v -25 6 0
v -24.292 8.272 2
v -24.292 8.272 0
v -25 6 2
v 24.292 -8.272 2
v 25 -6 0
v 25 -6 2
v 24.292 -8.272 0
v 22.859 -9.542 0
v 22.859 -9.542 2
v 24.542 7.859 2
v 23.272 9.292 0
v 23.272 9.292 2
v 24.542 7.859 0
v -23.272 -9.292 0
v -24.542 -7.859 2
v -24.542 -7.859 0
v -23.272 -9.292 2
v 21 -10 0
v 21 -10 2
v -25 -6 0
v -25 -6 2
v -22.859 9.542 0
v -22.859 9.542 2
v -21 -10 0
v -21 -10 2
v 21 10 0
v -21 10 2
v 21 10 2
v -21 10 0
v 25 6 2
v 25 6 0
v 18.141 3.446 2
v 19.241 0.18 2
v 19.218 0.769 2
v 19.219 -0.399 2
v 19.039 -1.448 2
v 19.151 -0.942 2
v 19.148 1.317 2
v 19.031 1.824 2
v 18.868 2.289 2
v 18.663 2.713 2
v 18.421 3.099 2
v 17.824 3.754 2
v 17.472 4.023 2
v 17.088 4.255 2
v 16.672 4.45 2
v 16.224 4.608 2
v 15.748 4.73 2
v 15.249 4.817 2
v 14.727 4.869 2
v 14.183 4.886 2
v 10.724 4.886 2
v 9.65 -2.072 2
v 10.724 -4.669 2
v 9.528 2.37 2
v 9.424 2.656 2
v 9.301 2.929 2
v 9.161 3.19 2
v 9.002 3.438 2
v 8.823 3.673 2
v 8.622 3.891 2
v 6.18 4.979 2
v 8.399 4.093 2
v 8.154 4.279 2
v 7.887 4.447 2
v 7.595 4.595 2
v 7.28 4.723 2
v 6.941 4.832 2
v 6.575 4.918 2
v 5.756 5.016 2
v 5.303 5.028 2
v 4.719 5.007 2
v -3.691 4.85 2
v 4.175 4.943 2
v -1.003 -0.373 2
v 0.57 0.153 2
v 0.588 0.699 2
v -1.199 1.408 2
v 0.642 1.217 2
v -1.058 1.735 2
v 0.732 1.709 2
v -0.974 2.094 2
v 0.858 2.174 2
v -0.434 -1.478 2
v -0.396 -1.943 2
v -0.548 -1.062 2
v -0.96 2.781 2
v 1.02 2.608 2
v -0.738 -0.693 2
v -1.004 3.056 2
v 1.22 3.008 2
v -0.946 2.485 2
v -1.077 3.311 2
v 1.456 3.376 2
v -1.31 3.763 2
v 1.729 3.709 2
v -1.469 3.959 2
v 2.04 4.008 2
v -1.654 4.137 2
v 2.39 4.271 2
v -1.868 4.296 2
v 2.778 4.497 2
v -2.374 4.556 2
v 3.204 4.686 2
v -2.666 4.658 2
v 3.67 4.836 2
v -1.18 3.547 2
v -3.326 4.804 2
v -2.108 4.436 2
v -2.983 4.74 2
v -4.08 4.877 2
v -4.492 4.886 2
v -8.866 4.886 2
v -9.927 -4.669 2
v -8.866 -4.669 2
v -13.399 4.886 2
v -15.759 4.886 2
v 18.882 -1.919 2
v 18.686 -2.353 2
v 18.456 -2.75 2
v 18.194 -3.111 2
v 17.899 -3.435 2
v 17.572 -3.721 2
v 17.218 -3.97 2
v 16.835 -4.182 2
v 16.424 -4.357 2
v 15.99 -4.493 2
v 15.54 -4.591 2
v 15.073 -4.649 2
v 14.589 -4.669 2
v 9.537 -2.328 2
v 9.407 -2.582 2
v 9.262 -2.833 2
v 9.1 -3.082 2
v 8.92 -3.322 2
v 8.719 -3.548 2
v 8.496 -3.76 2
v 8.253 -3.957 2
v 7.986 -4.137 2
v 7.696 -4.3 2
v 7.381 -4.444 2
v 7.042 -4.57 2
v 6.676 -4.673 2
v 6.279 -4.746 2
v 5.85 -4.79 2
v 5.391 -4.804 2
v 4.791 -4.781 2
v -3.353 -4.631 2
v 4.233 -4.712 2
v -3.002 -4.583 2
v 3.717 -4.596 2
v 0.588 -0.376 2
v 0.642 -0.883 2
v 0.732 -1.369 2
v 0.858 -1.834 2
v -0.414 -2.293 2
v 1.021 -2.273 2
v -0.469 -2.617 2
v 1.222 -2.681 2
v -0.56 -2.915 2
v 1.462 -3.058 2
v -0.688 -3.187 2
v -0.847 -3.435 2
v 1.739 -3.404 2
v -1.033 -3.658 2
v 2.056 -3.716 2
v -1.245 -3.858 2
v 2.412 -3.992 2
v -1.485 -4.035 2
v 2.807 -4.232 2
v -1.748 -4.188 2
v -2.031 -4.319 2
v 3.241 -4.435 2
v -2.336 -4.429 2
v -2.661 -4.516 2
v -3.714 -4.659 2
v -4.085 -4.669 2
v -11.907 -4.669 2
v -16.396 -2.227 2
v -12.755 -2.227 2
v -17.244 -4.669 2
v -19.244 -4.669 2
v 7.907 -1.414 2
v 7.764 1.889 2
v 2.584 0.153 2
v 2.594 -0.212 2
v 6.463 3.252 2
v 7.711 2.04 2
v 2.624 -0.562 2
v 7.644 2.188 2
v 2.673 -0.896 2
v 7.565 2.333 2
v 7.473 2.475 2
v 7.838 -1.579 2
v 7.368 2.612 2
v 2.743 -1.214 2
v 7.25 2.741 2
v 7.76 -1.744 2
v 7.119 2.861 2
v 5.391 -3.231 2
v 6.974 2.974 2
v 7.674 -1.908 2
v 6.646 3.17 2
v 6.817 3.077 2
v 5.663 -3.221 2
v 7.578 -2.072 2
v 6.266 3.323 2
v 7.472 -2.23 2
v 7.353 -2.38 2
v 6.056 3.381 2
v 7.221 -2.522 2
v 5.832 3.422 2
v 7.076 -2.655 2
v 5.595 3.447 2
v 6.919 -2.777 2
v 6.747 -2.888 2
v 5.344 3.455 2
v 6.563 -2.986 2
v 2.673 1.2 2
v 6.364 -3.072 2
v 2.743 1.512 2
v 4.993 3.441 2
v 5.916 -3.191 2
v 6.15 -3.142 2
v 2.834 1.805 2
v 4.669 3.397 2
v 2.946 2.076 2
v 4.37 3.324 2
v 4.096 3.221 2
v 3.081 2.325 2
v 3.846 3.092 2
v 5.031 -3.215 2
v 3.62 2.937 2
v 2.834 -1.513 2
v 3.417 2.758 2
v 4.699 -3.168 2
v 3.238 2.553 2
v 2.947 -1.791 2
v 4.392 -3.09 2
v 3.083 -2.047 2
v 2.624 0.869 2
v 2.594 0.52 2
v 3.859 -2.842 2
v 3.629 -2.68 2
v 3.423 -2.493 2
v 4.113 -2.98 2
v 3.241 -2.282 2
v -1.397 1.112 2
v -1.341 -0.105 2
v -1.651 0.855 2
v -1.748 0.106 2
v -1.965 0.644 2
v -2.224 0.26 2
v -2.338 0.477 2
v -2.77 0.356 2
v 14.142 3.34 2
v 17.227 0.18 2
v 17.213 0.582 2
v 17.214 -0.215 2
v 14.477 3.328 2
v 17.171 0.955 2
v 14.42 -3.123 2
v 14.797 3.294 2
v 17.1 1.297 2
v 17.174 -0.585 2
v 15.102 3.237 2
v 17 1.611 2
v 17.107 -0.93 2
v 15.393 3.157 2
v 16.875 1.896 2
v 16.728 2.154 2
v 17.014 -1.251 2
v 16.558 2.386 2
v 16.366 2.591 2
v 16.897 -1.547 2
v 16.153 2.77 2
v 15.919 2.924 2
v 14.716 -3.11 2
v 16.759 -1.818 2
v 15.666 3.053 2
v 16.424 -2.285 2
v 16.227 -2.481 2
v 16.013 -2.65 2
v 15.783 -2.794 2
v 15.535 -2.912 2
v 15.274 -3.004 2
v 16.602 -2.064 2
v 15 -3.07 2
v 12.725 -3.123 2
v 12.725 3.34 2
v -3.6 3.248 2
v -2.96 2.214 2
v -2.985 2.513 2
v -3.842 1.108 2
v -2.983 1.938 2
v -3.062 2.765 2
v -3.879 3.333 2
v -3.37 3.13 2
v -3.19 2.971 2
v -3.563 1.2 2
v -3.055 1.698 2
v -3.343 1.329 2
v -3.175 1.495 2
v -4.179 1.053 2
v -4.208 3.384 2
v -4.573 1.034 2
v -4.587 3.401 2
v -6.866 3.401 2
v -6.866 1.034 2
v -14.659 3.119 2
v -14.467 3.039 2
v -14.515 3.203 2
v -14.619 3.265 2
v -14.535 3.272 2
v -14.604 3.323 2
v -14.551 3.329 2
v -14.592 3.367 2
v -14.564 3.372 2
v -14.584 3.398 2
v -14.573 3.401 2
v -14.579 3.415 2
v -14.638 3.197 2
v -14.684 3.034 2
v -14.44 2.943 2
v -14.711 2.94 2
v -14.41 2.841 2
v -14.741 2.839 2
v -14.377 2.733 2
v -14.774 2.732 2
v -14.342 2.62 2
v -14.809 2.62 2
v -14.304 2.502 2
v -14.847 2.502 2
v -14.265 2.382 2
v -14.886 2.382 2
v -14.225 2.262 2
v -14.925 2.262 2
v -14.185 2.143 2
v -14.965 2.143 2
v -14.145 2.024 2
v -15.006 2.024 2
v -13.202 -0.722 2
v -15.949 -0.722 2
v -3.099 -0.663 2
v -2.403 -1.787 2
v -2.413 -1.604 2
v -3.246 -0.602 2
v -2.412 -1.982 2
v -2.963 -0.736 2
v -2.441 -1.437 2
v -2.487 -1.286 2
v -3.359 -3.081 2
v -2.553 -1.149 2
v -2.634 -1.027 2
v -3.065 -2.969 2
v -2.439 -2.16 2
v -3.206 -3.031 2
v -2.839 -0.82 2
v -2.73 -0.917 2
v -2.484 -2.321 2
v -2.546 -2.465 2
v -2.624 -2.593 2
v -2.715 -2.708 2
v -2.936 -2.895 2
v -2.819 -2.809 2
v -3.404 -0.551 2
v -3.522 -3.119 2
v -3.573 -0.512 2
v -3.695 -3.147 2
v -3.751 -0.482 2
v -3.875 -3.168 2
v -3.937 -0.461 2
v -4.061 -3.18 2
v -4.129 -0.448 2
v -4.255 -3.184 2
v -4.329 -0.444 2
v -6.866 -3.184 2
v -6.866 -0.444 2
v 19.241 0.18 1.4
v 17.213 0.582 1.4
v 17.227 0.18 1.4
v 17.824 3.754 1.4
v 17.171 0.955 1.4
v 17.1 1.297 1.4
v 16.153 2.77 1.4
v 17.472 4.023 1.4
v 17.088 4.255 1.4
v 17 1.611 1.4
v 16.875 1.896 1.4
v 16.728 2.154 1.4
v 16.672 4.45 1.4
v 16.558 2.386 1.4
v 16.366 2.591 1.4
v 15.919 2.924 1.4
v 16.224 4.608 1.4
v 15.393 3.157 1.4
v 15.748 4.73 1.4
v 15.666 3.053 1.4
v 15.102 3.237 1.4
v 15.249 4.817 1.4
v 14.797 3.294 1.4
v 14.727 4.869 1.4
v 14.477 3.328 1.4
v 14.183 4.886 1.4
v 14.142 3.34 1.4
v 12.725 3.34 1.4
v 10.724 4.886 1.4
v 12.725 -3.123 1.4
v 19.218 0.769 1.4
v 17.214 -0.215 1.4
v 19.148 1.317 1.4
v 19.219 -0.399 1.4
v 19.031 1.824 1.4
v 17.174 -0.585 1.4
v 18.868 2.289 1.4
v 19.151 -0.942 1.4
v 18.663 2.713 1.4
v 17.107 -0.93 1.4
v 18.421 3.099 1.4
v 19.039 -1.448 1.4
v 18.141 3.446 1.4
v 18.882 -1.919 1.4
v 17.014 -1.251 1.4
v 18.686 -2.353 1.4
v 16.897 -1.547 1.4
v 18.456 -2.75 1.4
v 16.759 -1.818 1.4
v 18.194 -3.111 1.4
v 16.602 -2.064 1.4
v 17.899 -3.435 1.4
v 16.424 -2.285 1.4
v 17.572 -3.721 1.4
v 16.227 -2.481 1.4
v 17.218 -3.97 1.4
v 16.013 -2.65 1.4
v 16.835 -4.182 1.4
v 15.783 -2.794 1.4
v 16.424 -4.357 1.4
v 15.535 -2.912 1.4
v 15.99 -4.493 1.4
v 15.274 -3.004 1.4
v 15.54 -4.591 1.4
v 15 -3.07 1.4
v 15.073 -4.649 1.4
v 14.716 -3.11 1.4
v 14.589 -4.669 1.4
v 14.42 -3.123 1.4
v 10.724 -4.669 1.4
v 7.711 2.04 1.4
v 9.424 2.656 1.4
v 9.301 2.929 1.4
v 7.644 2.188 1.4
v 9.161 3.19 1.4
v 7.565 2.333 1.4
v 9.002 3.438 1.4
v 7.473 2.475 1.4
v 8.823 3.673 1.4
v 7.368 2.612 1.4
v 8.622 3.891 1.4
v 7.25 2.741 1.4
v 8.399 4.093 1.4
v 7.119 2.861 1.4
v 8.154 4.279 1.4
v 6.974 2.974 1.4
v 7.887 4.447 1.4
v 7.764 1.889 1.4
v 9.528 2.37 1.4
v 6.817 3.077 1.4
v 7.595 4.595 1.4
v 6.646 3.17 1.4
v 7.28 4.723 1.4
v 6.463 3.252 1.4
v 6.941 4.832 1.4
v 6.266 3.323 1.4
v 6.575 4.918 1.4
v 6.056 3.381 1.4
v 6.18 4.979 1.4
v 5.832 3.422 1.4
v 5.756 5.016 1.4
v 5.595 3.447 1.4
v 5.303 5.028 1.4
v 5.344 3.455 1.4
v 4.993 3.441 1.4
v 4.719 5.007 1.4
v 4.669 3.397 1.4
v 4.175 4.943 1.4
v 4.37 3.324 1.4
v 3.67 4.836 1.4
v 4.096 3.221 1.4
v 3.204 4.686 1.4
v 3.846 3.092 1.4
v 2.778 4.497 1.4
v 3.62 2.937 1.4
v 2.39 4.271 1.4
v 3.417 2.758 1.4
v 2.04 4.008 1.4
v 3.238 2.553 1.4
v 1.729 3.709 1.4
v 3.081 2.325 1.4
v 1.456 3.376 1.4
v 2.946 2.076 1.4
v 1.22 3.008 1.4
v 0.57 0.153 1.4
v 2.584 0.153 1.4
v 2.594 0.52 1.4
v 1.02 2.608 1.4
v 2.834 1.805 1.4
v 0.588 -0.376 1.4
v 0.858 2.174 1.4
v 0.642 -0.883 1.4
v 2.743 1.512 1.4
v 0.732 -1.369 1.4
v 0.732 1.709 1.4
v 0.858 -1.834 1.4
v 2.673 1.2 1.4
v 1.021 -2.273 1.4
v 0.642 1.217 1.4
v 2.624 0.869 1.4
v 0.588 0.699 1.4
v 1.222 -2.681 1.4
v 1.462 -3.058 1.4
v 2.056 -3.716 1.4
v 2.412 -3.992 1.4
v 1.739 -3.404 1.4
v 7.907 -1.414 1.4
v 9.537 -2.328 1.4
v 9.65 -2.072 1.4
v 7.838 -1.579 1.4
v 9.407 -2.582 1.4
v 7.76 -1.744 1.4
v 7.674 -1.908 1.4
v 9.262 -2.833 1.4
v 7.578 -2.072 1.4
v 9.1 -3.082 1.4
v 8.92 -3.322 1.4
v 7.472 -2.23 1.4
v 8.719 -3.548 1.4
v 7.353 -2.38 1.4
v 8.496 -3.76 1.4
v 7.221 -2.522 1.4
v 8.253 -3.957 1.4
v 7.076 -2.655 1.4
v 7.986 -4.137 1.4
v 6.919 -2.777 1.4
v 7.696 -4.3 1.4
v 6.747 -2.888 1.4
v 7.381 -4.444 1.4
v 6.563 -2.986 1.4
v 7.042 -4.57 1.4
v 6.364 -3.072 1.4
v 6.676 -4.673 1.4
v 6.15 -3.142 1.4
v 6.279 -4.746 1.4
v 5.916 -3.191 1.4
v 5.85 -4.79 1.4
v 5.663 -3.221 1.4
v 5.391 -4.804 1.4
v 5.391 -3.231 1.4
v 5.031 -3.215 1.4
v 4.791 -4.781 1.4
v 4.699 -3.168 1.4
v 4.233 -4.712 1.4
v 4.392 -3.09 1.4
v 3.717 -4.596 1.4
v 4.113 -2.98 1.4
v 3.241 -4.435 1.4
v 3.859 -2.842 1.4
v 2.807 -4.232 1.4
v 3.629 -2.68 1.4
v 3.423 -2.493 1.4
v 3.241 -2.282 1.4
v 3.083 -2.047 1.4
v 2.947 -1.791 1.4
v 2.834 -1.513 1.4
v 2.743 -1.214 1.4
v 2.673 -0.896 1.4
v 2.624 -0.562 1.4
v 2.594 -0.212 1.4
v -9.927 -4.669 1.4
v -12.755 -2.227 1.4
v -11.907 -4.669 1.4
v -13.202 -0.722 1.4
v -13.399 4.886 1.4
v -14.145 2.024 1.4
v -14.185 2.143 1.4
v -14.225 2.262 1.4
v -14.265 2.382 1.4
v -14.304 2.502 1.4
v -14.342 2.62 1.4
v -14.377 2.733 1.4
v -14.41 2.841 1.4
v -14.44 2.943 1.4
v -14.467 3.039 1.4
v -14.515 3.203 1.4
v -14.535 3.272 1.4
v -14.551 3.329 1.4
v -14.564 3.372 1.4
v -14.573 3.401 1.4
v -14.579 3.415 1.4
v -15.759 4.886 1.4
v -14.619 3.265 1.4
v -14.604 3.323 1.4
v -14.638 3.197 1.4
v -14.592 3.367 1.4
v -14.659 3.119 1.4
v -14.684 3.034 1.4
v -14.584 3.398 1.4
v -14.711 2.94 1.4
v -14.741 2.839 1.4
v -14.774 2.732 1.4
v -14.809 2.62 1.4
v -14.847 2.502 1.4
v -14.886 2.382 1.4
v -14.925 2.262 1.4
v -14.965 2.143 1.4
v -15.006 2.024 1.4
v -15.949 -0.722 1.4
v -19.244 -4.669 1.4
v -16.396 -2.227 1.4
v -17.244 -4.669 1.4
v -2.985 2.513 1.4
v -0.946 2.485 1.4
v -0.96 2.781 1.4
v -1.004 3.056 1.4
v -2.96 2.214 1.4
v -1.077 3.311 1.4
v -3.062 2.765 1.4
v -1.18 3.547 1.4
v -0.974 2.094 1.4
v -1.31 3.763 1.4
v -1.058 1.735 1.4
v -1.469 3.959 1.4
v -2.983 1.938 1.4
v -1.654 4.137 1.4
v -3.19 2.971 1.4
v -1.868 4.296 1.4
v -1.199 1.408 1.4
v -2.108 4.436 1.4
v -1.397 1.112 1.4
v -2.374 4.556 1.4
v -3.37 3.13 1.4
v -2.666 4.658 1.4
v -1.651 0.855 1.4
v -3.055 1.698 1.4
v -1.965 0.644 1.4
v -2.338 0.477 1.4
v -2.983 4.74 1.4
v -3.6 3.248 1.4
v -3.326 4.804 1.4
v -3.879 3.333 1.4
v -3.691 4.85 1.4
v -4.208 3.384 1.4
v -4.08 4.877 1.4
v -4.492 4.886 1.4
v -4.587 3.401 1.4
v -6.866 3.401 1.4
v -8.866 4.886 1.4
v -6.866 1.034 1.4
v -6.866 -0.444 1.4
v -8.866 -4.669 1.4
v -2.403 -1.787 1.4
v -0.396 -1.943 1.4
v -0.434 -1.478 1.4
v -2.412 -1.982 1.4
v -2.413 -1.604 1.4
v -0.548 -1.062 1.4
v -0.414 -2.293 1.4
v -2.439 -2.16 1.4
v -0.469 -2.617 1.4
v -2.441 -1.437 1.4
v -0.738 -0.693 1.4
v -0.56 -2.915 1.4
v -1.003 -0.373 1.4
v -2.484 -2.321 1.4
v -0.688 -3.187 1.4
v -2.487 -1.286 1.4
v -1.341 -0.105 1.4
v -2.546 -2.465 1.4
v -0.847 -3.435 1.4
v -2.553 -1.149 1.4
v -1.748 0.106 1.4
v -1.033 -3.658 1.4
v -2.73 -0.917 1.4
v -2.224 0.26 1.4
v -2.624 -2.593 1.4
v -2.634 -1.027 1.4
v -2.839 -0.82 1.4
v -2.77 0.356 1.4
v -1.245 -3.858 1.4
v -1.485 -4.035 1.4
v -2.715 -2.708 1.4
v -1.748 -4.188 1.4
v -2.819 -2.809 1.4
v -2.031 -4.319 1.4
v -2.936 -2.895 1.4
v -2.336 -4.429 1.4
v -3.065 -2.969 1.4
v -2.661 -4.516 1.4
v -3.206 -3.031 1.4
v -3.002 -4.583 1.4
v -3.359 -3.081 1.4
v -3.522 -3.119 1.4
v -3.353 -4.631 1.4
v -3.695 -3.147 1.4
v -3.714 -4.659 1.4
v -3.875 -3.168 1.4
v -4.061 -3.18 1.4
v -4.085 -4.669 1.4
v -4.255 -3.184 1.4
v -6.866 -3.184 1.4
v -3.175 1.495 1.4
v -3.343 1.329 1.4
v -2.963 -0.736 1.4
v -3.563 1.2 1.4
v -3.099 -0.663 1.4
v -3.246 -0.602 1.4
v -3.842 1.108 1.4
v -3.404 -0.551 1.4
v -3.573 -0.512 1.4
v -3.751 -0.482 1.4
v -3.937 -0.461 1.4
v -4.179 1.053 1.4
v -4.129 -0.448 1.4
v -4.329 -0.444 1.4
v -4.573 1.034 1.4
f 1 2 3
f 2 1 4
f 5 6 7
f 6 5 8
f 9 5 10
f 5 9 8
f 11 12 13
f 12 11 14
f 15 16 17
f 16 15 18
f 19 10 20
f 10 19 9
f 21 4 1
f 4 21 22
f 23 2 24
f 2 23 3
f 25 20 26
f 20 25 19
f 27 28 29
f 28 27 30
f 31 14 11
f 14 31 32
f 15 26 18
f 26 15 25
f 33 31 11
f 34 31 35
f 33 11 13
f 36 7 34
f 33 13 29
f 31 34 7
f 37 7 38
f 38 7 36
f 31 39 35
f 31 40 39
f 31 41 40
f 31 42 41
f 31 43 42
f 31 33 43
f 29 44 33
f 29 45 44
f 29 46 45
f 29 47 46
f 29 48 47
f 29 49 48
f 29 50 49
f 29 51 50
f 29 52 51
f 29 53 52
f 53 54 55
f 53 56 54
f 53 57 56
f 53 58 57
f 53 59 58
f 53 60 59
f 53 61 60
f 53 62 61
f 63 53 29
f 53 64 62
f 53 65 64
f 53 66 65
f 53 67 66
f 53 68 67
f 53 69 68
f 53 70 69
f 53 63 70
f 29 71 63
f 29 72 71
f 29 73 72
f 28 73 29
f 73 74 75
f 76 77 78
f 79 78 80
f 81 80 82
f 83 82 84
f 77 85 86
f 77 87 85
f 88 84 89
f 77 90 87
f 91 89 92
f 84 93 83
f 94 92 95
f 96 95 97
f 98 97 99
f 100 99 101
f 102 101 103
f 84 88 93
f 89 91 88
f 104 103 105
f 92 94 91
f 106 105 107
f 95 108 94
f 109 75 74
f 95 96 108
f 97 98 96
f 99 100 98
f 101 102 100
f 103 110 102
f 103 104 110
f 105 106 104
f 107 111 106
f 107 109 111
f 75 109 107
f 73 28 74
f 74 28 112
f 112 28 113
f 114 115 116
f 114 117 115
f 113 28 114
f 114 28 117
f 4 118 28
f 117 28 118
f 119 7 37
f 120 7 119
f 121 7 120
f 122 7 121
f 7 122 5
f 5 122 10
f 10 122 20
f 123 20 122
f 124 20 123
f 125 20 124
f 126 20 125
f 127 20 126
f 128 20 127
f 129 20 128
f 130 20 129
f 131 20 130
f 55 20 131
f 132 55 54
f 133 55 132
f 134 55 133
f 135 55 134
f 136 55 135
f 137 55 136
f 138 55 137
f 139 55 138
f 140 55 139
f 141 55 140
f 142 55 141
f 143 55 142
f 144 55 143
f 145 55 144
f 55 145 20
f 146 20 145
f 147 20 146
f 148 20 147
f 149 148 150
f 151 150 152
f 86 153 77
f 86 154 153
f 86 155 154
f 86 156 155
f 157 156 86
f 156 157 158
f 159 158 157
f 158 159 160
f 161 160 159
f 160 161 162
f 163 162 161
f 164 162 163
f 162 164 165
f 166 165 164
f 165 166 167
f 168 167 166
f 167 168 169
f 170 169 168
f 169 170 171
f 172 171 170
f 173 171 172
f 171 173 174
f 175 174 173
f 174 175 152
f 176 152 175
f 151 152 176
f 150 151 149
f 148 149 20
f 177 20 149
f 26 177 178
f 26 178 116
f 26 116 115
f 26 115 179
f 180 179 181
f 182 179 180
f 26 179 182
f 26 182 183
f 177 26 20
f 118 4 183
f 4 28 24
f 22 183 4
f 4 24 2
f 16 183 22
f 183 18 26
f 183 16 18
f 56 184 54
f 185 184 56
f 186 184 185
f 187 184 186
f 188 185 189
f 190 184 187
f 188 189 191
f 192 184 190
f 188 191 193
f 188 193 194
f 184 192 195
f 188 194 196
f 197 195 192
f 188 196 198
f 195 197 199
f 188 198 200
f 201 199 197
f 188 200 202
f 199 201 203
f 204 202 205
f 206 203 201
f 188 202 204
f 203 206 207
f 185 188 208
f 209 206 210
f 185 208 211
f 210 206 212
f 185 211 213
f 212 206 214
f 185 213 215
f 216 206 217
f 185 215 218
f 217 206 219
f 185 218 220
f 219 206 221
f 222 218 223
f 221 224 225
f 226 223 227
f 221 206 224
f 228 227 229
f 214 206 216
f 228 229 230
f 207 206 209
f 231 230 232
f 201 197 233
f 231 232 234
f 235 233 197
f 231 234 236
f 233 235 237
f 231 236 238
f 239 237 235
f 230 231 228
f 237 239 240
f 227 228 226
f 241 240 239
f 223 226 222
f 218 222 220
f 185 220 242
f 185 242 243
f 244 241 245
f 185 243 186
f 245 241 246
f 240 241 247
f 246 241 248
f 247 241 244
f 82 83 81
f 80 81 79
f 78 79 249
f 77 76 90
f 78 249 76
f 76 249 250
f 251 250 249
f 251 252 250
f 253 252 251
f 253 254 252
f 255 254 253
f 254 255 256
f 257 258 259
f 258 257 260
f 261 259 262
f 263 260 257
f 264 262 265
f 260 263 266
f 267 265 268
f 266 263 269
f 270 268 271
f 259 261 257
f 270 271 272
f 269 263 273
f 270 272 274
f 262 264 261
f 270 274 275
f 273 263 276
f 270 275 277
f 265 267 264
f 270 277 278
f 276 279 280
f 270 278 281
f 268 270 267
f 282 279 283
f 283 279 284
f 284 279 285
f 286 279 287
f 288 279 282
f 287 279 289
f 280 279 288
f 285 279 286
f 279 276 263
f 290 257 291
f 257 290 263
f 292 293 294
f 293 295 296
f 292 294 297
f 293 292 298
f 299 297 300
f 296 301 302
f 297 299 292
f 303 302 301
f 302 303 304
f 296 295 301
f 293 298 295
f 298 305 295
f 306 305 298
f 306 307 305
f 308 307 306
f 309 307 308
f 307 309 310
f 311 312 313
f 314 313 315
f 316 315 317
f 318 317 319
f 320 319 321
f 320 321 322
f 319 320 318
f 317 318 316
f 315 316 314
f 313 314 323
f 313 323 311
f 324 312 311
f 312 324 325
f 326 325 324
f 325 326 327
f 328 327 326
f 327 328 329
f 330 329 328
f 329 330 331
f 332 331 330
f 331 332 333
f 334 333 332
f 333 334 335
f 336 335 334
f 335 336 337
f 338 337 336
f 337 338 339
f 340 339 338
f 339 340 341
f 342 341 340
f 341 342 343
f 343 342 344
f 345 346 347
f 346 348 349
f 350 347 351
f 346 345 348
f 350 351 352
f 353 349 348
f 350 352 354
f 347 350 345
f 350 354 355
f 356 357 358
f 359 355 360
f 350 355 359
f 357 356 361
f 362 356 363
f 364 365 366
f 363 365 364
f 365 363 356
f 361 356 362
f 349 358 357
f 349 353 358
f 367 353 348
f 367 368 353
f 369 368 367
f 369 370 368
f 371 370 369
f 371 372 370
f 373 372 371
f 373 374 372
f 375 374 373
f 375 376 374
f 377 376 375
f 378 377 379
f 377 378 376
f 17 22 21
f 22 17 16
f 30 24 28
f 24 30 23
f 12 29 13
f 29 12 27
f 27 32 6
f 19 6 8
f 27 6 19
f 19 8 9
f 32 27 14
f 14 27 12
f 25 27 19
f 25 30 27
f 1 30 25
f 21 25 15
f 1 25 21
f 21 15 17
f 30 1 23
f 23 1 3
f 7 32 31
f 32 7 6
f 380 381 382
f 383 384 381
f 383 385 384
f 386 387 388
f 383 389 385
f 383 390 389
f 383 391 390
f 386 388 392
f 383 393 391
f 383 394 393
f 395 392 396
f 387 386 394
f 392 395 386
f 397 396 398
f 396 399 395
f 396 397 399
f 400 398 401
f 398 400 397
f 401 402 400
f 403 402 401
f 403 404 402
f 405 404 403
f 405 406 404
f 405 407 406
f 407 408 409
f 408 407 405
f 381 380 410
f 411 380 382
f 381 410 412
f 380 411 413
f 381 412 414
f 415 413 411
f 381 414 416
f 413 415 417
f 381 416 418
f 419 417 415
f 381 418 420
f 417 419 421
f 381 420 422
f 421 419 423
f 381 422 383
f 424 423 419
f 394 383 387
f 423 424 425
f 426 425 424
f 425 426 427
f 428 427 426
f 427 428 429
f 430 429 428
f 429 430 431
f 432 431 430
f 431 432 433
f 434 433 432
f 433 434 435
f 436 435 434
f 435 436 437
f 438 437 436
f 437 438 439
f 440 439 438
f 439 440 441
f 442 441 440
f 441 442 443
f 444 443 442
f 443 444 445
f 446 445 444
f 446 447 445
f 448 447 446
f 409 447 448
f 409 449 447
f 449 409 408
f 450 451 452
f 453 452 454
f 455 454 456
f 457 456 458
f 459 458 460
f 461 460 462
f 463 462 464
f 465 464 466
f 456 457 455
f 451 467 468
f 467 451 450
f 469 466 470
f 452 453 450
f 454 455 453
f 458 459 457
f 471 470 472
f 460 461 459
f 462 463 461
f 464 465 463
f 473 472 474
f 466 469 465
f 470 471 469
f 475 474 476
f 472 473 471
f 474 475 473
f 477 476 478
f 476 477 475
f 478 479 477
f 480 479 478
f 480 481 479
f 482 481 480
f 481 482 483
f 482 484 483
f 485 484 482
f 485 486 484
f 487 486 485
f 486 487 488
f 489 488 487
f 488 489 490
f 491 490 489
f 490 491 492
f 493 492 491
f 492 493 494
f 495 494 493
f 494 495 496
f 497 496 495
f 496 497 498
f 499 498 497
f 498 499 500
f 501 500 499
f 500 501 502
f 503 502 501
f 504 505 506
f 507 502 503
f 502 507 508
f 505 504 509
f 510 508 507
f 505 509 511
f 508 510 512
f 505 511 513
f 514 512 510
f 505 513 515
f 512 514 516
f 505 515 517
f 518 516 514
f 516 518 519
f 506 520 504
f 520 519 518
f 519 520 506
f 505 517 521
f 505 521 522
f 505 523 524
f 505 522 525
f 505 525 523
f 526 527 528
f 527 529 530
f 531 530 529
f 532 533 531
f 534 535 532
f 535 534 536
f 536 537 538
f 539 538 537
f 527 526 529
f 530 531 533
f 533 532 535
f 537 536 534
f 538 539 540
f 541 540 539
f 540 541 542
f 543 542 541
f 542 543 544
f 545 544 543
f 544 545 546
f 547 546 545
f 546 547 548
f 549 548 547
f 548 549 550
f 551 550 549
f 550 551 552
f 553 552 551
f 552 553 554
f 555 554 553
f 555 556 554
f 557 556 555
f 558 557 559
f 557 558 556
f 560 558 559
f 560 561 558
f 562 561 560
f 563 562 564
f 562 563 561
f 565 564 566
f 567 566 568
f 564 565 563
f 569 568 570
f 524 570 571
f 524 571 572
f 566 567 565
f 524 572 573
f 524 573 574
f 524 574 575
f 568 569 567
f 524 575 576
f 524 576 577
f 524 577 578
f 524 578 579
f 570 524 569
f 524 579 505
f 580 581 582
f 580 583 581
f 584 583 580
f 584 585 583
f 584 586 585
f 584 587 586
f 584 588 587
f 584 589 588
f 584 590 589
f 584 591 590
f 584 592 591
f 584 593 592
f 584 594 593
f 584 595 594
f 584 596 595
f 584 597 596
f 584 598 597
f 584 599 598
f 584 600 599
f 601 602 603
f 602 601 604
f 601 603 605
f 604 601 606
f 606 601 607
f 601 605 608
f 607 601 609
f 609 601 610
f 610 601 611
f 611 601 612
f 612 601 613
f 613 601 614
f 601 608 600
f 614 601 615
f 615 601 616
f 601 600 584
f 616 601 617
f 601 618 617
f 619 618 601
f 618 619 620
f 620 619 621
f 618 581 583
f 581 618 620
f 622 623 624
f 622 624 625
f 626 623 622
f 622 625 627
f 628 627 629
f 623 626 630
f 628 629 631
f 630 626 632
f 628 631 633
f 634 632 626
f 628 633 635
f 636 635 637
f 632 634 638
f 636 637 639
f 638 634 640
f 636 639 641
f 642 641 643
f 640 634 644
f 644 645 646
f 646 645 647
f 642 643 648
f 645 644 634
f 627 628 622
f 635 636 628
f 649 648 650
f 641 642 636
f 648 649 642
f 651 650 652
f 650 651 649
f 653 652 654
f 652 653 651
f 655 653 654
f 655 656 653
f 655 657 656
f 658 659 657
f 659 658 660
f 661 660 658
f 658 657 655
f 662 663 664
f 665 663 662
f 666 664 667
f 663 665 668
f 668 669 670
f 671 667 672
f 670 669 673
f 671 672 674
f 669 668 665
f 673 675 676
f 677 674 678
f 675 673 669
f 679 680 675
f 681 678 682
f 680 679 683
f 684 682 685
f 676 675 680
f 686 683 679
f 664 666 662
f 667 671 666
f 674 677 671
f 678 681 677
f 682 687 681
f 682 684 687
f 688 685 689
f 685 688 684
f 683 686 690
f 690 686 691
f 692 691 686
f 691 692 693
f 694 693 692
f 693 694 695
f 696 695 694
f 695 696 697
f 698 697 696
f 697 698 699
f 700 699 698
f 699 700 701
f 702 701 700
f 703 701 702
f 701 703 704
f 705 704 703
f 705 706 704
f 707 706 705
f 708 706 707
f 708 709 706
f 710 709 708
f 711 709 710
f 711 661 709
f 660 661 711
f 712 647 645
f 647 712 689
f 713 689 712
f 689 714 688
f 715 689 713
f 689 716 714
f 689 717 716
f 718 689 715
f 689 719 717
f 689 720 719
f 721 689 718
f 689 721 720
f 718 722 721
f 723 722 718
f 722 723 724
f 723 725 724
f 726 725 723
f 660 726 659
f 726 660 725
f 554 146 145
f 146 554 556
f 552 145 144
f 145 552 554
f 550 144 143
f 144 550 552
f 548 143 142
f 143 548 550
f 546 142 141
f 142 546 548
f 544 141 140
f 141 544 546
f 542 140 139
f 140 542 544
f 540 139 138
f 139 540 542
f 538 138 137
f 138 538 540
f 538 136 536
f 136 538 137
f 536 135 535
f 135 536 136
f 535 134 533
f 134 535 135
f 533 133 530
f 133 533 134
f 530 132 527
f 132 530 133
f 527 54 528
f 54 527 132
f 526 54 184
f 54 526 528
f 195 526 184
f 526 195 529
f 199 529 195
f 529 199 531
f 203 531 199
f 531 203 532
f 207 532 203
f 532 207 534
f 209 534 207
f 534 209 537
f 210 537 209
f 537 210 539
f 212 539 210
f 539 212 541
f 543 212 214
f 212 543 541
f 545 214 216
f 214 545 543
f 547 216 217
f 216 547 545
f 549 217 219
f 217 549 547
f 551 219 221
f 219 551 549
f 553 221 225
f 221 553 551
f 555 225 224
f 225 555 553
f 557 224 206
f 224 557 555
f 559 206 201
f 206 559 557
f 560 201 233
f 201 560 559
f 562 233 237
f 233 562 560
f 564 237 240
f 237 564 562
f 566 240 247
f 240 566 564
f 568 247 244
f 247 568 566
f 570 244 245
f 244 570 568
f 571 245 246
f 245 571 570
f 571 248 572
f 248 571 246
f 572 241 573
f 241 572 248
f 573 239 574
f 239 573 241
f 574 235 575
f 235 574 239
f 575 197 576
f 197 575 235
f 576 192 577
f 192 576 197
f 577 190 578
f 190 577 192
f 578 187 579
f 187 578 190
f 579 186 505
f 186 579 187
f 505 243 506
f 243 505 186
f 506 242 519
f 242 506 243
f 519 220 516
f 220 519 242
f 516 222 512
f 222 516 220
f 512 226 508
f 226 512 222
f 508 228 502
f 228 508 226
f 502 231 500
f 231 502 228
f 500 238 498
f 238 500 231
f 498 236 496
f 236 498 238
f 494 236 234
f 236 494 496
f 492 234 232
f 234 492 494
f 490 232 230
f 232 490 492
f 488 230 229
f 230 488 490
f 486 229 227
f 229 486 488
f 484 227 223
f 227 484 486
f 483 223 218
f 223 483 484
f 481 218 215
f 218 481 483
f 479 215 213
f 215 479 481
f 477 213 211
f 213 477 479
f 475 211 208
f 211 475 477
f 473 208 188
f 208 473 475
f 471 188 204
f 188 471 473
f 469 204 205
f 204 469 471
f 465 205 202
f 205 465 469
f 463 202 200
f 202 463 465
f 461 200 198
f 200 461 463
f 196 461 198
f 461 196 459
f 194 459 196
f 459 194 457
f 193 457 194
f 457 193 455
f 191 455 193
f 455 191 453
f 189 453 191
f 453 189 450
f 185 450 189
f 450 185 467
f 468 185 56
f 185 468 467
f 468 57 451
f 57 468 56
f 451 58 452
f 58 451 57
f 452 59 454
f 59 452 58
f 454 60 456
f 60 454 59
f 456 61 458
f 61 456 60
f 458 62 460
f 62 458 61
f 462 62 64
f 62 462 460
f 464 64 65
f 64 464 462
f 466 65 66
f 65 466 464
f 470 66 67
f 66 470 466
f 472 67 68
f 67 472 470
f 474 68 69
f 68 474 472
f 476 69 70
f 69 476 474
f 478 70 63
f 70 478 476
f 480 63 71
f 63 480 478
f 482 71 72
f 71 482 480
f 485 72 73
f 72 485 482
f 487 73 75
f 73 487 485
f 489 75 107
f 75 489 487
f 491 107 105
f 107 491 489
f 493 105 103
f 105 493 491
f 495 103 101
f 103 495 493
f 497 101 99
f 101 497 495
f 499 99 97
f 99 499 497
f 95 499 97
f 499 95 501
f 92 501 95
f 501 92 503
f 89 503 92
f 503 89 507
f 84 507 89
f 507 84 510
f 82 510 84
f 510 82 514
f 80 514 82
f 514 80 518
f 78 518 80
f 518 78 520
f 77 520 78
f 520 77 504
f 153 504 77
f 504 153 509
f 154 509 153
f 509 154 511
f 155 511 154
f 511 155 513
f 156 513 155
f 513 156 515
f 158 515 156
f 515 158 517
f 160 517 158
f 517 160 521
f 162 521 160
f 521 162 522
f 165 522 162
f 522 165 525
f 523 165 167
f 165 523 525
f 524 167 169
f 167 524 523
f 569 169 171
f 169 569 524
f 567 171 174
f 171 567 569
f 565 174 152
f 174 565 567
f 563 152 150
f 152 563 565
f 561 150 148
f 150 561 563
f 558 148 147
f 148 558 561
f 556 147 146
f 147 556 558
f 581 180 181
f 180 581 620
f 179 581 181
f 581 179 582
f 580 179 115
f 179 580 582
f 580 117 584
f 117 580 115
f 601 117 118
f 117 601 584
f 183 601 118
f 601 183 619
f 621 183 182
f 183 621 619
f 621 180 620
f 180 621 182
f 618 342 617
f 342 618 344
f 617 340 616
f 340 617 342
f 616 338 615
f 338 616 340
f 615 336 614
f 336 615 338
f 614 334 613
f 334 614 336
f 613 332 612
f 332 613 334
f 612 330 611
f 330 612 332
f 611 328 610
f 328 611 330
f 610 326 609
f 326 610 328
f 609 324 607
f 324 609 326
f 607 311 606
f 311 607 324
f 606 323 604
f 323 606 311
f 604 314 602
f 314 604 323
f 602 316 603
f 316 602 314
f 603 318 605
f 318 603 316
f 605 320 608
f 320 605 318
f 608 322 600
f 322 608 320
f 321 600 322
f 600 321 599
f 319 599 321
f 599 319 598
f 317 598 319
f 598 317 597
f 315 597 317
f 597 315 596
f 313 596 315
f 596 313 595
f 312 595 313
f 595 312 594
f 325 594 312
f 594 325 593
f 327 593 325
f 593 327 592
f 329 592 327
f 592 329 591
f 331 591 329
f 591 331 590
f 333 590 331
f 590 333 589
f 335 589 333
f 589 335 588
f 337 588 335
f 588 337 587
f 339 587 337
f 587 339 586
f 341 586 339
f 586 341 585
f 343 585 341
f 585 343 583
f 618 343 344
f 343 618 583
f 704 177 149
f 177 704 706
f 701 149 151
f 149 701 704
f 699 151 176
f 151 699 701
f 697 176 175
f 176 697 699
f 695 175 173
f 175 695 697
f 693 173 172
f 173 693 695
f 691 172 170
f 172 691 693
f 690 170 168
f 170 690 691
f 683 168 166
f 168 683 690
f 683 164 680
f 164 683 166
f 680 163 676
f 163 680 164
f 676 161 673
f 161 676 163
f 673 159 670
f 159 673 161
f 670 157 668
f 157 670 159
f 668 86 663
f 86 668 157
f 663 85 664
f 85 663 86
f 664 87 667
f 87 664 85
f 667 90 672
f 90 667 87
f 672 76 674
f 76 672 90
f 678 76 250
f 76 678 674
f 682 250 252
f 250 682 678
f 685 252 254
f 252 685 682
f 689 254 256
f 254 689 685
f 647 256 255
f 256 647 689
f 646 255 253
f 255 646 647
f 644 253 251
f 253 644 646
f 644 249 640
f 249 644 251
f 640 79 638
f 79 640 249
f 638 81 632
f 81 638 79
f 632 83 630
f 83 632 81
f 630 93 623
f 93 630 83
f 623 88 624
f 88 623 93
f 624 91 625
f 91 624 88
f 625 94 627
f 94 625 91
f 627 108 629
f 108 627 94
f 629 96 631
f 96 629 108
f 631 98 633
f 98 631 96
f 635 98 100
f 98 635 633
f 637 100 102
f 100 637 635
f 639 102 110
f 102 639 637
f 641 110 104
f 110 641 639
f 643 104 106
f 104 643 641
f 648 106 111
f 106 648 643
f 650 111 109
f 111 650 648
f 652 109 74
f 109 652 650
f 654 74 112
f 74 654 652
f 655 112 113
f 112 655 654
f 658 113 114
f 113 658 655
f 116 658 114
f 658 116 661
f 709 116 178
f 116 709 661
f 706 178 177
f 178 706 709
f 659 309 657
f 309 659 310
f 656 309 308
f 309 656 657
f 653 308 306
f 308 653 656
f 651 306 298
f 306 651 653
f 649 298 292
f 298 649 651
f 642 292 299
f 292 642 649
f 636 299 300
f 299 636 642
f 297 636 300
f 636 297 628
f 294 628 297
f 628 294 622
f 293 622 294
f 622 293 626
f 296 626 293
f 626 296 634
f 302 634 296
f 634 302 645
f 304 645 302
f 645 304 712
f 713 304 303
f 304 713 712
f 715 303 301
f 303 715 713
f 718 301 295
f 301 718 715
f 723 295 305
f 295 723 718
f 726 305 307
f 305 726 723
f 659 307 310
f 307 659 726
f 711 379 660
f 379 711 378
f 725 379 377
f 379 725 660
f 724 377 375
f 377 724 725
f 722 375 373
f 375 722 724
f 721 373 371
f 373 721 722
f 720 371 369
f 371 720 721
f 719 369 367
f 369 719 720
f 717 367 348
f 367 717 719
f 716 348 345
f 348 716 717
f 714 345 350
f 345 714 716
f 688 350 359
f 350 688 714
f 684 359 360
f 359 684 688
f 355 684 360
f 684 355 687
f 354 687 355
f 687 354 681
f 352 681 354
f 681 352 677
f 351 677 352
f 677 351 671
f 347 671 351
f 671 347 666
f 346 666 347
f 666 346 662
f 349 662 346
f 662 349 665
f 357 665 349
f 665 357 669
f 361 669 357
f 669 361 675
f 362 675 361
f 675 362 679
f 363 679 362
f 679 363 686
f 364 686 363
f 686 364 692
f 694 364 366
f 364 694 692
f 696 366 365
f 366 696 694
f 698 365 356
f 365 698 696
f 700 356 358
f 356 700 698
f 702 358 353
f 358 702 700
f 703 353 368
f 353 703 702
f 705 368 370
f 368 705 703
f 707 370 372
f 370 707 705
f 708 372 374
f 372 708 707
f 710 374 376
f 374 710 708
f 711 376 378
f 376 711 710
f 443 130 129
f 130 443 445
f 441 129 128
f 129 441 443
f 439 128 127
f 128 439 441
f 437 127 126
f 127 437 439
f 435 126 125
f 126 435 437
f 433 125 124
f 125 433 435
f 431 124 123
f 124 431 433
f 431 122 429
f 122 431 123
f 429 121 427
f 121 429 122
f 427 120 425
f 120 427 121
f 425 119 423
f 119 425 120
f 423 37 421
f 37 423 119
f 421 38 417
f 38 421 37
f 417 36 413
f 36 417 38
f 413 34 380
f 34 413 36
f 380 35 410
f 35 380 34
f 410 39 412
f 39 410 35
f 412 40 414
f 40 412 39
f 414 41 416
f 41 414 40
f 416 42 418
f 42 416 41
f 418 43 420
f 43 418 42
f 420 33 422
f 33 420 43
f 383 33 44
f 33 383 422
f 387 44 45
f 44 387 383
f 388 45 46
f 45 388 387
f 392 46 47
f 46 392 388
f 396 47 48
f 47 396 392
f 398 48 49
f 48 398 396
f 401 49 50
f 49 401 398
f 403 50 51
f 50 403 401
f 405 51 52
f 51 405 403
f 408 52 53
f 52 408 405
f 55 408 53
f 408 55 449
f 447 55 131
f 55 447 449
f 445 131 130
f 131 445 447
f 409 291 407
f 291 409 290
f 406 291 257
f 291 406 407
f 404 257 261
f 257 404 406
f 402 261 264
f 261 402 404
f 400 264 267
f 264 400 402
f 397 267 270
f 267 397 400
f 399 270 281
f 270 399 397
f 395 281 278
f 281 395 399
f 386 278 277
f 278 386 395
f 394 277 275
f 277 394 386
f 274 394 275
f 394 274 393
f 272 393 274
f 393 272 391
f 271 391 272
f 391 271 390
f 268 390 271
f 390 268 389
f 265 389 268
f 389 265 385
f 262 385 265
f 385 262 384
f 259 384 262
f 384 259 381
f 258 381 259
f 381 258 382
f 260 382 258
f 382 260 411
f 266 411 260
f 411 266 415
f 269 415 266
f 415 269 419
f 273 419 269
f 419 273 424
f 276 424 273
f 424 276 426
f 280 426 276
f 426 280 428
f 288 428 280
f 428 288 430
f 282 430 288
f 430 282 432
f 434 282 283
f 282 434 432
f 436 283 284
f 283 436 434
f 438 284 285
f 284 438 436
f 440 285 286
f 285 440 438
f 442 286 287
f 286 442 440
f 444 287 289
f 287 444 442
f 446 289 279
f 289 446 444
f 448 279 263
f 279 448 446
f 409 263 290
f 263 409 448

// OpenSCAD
name_text      = "ABCD";
plate_width    = 50; 
plate_height   = 20;  
plate_thickness= 2;     

text_size      = 10;    
text_depth     = 0.6;  
font_name      = "Liberation Sans:style=Bold";

corner_radius  = 4;     
hole_radius    = 2;     
hole_offset    = 6;     

raised_text    = false;  

module rounded_plate(w, h, r, t) {
    linear_extrude(height = t)
        offset(r = r)
            square([w - 2*r, h - 2*r], center = true);
}

module mounting_holes(w, h, r, off) {
    for (x = [-w/2 + off, w/2 - off])
        for (y = [-h/2 + off, h/2 - off])
            translate([x, y, -1])
                cylinder(h = plate_thickness + 2, r = r, $fn = 32);
}

module name_text_3d(txt, size, depth) {
    linear_extrude(height = depth)
        text(txt,
             size = size,
             font = font_name,
             halign = "center",
             valign = "center");
}

difference() {
    rounded_plate(plate_width, plate_height, corner_radius, plate_thickness);

    if (!raised_text)
        translate([0, 0, plate_thickness - text_depth])
            name_text_3d(name_text, text_size, text_depth);
}

if (raised_text)
    translate([0, 0, plate_thickness])
        name_text_3d(name_text, text_size, text_depth);
